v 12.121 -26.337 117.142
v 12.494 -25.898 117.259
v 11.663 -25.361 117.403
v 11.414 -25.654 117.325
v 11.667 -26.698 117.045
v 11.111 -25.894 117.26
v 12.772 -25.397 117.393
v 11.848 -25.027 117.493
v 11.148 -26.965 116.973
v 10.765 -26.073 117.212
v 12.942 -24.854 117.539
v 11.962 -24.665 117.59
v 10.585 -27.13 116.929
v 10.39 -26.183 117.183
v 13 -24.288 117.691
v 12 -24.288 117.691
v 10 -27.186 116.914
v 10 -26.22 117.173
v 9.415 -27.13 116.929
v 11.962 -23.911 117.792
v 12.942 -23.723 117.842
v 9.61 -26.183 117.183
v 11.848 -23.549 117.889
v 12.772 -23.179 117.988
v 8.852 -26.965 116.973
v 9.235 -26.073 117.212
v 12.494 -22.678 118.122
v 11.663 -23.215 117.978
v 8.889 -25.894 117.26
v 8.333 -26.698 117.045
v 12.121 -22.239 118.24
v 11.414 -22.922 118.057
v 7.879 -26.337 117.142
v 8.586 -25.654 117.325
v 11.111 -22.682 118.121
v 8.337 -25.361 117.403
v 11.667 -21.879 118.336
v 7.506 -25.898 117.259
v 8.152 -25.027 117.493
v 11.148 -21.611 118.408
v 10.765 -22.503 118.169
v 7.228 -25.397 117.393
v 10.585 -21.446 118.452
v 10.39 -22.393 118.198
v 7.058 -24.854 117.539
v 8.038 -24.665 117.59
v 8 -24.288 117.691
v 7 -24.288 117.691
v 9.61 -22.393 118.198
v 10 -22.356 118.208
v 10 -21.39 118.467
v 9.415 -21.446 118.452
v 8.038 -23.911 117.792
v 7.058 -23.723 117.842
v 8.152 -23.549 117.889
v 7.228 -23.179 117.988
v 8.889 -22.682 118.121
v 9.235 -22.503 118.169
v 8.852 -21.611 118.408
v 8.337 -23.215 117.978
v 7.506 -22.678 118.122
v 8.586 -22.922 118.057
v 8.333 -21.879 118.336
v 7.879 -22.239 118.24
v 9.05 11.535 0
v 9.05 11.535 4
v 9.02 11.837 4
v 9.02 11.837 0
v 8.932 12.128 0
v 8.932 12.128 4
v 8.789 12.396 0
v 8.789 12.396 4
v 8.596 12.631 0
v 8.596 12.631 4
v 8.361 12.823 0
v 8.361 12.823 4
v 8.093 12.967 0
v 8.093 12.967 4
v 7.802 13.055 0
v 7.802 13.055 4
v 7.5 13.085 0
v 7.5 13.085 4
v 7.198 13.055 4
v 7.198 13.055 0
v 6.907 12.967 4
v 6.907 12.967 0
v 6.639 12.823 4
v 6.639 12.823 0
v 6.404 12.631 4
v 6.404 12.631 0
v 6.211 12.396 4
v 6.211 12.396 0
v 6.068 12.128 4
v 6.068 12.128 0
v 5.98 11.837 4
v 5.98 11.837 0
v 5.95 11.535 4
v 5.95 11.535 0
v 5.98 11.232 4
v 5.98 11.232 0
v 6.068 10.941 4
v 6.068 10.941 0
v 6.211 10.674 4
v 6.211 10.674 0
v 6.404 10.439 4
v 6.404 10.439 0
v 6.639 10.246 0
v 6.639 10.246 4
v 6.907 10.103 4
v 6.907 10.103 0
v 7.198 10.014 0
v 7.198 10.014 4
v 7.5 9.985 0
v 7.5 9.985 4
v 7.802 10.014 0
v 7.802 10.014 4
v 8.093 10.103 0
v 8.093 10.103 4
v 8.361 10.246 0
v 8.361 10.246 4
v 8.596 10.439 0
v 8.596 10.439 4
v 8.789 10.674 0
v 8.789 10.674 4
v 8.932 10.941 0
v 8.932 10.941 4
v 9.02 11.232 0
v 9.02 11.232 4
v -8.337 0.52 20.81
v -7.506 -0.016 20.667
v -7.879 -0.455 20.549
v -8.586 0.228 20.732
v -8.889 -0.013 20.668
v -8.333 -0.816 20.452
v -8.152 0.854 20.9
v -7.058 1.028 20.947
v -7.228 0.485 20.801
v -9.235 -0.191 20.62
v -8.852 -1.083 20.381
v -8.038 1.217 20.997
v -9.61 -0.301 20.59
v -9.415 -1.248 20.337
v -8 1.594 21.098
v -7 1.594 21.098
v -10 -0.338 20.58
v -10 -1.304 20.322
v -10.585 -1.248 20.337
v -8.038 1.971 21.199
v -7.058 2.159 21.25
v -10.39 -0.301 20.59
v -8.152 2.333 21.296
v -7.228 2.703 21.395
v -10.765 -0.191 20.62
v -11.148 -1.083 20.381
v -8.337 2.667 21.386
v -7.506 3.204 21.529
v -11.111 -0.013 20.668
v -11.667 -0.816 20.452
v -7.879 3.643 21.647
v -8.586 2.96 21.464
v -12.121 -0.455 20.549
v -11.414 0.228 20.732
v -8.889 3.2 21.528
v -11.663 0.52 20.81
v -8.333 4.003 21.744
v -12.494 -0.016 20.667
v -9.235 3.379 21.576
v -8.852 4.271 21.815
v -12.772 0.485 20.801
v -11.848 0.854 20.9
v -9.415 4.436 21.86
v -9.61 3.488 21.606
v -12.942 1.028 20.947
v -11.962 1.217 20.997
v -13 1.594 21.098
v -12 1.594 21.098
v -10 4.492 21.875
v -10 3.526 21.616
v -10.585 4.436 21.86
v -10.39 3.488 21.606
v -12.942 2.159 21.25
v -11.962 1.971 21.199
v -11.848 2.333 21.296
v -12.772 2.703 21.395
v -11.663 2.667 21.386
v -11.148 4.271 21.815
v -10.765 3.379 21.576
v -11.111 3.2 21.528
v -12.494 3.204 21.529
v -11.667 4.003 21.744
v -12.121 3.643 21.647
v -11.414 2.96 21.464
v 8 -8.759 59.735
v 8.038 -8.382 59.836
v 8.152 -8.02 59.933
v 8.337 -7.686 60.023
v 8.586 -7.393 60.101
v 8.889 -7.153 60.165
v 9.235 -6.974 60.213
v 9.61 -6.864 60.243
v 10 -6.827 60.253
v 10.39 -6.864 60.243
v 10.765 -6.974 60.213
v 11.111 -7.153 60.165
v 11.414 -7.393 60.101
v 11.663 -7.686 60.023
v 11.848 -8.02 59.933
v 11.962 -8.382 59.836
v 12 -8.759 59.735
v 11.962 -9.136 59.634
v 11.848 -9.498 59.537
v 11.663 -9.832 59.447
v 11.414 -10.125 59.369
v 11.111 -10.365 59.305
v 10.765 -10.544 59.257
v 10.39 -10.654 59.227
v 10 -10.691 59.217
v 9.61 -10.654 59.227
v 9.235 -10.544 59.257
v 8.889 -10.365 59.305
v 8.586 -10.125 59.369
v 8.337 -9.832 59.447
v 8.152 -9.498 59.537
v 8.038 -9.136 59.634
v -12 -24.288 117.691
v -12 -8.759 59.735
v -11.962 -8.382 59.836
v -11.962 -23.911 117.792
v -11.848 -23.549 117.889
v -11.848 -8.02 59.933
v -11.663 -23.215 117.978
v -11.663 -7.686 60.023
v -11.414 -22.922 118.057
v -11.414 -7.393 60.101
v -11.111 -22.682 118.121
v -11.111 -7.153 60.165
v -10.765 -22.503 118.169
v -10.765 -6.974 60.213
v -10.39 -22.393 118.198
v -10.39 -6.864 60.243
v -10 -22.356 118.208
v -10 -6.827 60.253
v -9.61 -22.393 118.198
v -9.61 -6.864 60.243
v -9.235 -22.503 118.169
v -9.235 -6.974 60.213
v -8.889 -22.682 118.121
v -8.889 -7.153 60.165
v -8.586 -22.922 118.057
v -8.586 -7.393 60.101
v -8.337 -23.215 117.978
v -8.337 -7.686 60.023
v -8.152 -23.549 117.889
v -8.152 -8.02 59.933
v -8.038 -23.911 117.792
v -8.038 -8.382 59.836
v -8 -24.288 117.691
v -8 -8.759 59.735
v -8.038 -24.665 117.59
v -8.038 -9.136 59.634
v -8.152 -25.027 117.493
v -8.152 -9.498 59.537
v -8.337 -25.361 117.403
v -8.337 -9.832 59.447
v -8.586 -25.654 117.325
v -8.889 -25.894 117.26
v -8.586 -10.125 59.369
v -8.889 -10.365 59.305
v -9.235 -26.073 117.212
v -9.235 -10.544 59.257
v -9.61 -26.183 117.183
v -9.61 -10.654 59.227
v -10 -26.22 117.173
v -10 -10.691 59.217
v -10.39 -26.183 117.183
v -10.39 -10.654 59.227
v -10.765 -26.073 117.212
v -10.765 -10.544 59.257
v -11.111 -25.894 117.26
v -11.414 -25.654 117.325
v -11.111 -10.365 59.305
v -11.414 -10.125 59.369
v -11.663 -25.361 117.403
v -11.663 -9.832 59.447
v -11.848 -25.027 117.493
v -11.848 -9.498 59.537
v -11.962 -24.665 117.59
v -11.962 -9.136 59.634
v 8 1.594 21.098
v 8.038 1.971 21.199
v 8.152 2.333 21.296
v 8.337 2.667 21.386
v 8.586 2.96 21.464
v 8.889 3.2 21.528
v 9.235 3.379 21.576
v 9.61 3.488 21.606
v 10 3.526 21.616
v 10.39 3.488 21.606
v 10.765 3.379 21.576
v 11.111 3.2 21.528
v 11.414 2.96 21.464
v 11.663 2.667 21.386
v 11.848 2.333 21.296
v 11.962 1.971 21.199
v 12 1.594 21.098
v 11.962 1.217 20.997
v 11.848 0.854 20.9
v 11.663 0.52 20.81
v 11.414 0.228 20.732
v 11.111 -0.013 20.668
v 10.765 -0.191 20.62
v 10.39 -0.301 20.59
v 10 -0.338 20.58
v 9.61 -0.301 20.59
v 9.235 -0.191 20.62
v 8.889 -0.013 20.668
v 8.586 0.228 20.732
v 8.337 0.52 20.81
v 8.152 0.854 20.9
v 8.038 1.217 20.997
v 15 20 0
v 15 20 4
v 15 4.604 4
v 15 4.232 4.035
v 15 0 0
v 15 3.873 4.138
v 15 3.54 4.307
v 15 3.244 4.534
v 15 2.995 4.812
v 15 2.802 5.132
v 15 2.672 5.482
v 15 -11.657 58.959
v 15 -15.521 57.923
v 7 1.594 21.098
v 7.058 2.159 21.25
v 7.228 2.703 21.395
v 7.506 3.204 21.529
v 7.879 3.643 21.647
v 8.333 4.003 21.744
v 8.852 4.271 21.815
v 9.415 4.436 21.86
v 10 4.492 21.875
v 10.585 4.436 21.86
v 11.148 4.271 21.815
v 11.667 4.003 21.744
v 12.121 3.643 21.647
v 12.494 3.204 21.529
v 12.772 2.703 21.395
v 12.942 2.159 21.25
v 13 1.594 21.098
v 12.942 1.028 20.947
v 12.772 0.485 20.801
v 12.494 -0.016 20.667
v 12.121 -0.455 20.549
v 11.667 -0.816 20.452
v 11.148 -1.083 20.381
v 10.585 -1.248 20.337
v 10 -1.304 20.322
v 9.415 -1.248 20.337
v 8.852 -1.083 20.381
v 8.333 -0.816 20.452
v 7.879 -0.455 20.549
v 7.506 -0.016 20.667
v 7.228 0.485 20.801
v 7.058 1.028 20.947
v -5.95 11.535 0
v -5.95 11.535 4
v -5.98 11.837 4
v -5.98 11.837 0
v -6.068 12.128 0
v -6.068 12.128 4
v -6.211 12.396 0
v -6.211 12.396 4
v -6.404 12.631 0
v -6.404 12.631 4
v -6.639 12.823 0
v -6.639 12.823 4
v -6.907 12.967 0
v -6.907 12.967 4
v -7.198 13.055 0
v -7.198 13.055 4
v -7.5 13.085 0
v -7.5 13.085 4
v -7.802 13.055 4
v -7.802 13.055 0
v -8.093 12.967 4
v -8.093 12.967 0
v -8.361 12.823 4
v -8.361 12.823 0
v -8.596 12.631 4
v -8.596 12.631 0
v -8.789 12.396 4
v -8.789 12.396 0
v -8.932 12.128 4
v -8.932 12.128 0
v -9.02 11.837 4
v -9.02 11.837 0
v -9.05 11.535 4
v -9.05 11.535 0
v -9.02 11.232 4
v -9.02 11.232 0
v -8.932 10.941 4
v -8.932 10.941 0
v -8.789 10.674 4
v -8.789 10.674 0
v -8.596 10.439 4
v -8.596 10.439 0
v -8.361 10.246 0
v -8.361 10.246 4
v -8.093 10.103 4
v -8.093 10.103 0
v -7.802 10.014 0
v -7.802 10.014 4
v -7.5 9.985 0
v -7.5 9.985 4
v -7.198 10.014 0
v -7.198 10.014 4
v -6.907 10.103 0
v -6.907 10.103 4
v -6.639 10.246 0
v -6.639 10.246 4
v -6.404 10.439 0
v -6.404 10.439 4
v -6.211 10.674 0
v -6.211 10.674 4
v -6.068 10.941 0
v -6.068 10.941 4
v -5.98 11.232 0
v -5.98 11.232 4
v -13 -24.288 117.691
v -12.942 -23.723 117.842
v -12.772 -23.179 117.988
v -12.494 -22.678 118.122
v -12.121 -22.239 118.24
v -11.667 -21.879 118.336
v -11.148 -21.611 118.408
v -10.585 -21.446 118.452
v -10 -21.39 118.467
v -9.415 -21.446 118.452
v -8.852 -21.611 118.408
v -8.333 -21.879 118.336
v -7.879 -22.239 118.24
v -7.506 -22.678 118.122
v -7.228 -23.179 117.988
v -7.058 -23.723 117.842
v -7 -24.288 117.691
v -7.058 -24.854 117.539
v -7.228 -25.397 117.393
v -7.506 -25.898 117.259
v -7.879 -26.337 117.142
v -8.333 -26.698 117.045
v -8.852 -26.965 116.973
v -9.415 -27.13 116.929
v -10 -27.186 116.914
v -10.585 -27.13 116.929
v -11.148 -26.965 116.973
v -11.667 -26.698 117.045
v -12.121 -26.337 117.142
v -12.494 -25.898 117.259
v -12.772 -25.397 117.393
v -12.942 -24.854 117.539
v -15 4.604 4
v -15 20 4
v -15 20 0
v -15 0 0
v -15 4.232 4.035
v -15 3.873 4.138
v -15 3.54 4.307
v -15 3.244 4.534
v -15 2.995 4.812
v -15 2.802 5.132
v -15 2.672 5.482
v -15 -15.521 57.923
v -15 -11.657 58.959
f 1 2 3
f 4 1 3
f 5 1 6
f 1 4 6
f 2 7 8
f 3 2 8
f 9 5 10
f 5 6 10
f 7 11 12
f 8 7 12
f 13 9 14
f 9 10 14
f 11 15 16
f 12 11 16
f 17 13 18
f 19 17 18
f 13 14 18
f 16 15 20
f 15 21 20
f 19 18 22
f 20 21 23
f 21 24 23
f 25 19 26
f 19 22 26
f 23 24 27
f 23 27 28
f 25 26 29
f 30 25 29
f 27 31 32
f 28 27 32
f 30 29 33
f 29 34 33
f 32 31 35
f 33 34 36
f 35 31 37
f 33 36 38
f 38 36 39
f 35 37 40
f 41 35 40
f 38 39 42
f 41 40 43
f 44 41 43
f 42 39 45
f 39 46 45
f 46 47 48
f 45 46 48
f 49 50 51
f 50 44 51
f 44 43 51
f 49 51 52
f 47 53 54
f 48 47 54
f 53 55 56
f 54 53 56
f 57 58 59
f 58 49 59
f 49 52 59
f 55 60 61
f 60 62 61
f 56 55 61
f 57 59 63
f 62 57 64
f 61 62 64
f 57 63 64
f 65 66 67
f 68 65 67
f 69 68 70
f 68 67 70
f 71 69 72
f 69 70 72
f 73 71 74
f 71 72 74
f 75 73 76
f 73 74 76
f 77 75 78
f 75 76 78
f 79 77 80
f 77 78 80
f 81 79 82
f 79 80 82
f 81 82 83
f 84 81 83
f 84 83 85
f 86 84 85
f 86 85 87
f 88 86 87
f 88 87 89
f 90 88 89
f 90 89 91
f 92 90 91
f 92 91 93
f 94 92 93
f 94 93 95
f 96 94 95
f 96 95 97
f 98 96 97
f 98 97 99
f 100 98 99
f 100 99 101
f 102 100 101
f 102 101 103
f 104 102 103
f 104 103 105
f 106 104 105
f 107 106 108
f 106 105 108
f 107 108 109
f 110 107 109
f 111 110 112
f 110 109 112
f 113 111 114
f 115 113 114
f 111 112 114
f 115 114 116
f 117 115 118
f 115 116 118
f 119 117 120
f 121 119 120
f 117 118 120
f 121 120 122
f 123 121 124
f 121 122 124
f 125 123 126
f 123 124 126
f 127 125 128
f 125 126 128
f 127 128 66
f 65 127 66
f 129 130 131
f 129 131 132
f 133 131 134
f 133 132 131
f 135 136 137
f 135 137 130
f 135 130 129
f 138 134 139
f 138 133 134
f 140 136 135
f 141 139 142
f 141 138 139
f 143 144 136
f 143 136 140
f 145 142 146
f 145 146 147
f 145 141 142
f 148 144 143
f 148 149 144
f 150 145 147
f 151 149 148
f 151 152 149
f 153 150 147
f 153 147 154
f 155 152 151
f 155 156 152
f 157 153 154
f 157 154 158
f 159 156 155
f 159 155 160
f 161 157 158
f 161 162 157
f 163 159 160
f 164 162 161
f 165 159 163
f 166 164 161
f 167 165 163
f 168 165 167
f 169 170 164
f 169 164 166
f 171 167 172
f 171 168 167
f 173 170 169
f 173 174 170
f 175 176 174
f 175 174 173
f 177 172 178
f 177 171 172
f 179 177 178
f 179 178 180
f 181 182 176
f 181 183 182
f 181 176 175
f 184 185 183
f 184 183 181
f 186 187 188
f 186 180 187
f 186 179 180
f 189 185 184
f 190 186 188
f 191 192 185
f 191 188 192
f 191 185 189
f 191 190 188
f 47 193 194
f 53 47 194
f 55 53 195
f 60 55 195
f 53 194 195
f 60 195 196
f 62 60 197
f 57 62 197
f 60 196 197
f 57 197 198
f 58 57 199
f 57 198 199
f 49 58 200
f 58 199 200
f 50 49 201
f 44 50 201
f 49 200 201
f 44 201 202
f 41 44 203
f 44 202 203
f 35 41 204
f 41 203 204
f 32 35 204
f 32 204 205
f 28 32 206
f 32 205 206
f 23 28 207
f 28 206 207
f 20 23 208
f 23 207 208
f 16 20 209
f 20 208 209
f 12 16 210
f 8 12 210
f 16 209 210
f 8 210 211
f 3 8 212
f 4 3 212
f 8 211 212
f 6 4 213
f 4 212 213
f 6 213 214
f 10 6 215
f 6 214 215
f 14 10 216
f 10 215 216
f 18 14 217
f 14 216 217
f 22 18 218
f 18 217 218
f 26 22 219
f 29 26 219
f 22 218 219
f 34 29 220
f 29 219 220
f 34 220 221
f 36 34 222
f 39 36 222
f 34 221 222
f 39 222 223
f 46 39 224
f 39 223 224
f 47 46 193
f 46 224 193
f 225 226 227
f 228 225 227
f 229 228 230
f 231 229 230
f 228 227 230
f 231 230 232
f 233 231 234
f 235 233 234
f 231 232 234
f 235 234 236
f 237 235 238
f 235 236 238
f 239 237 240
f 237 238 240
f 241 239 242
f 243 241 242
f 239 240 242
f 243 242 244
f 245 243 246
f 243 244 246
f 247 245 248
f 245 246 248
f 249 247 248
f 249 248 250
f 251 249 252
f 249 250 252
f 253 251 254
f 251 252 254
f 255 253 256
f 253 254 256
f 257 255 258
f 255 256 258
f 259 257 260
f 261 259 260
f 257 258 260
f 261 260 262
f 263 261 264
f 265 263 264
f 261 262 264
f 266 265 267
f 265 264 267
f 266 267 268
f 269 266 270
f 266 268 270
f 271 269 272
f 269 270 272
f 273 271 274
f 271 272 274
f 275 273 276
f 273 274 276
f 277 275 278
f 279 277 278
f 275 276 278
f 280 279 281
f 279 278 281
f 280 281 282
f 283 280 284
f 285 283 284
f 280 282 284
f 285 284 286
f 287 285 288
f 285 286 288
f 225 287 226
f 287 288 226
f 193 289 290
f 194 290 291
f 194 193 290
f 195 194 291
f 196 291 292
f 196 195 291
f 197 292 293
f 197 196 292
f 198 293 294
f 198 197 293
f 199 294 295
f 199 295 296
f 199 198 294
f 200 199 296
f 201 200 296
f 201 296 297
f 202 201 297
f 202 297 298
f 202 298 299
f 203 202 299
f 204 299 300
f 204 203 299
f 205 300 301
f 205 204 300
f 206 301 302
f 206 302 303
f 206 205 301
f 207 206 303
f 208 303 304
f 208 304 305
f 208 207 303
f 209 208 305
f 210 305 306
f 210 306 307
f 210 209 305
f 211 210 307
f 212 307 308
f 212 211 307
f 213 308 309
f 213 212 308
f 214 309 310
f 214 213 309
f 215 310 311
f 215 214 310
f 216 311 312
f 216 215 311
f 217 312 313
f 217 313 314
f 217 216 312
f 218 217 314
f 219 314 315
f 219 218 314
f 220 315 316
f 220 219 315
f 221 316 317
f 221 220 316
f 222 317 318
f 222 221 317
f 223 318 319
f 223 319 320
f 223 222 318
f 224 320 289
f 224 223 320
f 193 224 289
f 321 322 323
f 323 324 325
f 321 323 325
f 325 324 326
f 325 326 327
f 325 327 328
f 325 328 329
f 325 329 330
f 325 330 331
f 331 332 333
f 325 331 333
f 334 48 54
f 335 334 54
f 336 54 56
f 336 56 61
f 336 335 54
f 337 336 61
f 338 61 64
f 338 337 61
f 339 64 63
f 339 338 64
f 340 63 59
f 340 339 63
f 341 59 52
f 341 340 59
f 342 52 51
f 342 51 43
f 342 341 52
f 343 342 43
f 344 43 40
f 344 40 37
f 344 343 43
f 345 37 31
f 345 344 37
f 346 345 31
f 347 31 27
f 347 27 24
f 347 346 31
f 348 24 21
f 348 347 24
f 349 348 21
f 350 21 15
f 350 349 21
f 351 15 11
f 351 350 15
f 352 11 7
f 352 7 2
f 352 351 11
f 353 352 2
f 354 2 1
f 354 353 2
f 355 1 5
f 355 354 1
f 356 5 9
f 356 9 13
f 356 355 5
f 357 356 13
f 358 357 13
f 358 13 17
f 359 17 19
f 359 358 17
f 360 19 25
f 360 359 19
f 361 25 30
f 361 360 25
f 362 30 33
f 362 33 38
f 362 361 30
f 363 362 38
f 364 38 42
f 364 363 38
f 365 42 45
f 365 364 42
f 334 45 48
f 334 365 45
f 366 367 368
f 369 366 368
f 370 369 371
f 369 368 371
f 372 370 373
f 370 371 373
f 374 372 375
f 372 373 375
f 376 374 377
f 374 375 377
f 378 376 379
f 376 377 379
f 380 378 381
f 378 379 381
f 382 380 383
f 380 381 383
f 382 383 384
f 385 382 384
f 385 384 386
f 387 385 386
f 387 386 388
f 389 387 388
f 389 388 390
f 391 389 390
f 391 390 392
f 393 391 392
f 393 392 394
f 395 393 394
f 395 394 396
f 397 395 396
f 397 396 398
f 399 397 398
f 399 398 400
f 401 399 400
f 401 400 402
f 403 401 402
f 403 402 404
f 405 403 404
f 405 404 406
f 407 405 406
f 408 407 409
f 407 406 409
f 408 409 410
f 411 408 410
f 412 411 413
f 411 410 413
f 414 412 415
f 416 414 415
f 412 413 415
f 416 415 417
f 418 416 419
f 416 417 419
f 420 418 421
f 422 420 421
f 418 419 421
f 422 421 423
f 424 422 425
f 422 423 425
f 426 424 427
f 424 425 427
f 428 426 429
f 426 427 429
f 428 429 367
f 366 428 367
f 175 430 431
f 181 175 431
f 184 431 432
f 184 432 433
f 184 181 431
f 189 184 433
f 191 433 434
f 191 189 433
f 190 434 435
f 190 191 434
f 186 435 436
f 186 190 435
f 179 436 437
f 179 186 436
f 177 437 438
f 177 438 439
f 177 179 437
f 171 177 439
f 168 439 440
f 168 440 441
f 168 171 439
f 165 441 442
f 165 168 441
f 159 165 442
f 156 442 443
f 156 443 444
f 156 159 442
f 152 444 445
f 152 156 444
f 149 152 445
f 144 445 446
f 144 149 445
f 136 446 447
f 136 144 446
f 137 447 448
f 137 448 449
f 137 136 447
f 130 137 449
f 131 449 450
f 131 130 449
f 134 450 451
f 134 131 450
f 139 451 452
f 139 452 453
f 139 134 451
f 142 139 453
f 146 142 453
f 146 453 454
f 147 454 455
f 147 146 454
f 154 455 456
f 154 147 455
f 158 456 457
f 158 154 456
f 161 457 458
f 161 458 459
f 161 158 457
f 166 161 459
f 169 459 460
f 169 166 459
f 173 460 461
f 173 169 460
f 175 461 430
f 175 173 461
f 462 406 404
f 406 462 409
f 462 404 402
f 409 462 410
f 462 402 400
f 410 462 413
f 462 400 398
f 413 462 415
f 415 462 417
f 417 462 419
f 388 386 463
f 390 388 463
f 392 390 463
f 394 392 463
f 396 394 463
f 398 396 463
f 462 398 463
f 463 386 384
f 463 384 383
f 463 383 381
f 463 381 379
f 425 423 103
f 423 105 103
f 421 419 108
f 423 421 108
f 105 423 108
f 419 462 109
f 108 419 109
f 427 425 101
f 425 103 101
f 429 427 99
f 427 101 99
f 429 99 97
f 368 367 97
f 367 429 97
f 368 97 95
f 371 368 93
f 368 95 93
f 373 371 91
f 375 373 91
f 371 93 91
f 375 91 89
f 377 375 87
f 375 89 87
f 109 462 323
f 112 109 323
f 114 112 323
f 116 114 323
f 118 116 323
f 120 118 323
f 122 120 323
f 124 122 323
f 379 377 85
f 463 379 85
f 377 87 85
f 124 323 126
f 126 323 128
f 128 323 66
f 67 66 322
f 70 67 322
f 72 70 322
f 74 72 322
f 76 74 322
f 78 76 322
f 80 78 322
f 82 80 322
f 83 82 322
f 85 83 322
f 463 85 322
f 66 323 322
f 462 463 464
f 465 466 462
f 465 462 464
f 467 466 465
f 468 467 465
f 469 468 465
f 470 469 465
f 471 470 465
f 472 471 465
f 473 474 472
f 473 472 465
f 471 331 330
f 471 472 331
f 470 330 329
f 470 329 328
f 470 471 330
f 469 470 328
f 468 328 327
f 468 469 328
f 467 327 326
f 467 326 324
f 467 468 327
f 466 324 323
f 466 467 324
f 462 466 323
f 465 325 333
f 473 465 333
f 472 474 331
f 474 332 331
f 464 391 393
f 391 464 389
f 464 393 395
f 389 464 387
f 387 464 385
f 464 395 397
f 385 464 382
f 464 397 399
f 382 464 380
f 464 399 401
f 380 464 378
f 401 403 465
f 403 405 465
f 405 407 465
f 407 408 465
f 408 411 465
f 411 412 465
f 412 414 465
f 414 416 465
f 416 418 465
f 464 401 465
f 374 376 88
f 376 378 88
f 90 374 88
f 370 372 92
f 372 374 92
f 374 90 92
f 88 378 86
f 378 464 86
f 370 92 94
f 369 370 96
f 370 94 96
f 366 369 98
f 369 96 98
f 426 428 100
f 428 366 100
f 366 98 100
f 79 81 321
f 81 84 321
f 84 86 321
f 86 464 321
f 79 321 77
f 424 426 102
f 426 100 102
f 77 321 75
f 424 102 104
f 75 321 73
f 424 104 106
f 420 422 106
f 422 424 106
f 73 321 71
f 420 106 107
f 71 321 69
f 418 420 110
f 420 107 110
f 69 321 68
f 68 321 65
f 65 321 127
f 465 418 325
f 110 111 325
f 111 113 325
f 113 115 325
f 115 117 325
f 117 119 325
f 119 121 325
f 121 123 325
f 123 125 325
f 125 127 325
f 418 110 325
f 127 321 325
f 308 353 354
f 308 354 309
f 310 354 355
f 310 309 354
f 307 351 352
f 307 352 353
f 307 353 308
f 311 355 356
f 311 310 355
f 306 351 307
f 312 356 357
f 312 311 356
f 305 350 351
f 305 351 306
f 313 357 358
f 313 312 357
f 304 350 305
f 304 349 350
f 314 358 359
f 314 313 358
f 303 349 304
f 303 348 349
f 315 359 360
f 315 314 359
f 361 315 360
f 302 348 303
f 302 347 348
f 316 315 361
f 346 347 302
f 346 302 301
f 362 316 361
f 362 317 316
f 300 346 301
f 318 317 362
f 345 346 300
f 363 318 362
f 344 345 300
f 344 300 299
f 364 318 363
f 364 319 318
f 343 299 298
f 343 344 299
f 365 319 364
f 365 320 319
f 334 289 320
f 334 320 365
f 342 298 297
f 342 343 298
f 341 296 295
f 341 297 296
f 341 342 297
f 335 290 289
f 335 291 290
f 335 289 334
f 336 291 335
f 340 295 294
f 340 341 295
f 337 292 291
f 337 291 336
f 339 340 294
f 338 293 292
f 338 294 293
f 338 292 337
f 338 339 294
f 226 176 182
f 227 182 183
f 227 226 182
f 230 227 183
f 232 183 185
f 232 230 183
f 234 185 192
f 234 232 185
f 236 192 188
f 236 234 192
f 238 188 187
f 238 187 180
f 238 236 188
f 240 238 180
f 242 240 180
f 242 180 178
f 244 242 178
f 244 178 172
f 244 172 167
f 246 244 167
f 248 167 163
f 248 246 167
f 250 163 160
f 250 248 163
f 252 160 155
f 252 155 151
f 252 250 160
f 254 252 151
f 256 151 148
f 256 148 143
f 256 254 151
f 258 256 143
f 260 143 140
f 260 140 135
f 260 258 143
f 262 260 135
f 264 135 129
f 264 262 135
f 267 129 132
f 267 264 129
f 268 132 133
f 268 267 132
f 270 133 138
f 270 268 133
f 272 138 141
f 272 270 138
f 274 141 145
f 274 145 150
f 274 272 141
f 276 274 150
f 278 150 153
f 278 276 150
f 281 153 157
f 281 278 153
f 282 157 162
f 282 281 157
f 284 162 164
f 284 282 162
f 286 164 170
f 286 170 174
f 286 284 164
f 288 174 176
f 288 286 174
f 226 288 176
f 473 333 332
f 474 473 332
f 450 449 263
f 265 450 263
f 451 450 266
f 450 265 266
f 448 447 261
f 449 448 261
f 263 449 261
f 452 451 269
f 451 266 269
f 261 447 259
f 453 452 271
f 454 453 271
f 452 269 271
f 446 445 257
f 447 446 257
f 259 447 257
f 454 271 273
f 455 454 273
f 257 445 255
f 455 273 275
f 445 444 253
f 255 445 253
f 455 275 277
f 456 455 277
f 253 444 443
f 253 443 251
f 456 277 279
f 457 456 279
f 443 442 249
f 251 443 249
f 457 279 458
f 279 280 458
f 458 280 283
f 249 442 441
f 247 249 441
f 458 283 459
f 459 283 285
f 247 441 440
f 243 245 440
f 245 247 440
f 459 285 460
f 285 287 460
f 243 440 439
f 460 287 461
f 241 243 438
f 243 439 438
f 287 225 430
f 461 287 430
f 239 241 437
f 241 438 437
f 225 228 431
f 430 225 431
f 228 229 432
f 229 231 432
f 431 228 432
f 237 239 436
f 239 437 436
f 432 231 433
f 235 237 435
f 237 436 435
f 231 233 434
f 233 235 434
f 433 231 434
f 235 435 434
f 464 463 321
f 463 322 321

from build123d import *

# Parameters (mm, degrees)
BOSS_EXTRUDE1_DEPTH        = 15
SKETCH2_R                  = 3
SKETCH2_R_2                = 2
BOSS_EXTRUDE2_DEPTH        = 40
BOSS_EXTRUDE2_DEPTH_BACK   = 60
BOSS_EXTRUDE2_2_DEPTH      = 40
BOSS_EXTRUDE2_2_DEPTH_BACK = 60
SKETCH4_R                  = 1.55
CUT_EXTRUDE1_DEPTH         = 5
FILLET1_R                  = 2


with BuildPart() as part:
    # Sketch1 → Boss-Extrude1 (new body, symmetric)
    with BuildSketch(Plane.YZ):
        Polygon((-11.656809702, 58.958619281), (3.069307952, 4), (20, 4), (20, 0), (0, 0), (-15.520513007, 57.923343101), align=None)
    extrude(amount=BOSS_EXTRUDE1_DEPTH, both=True)

    # Sketch4 → Cut-Extrude1 (cut, through all)
    with BuildSketch(Plane.XY.offset(4)):
        with Locations((-7.5, 11.534653976)):
            Circle(SKETCH4_R)
        with Locations((7.5, 11.534653976)):
            Circle(SKETCH4_R)
    extrude(amount=-CUT_EXTRUDE1_DEPTH, mode=Mode.SUBTRACT)

    # Fillet1
    fillet1_edges = [part.edges().sort_by_distance(p)[0] for p in [
        (0, 3.069307952, 4),
    ]]
    fillet(fillet1_edges, radius=FILLET1_R)


with BuildPart() as body_2:
    # Sketch2 → Boss-Extrude2 (new body, two sides)
    with BuildSketch(Plane(origin=(0, -15.520513007, 57.923343101), x_dir=(-1, 0, 0), z_dir=(0, 0.258819045, -0.965925826))) as boss_extrude2_sk:
        with Locations((-10, 7)):
            Circle(SKETCH2_R)
        with Locations((-10, 7)):
            Circle(SKETCH2_R_2, mode=Mode.SUBTRACT)
    extrude(amount=BOSS_EXTRUDE2_DEPTH)
    extrude(boss_extrude2_sk.sketch, amount=-BOSS_EXTRUDE2_DEPTH_BACK)


with BuildPart() as body_3:
    # Sketch2 → Boss-Extrude2 2 (new body, two sides)
    with BuildSketch(Plane(origin=(0, -15.520513007, 57.923343101), x_dir=(-1, 0, 0), z_dir=(0, 0.258819045, -0.965925826))) as boss_extrude2_2_sk:
        with Locations((10, 7)):
            Circle(SKETCH2_R)
        with Locations((10, 7)):
            Circle(SKETCH2_R_2, mode=Mode.SUBTRACT)
    extrude(amount=BOSS_EXTRUDE2_2_DEPTH)
    extrude(boss_extrude2_2_sk.sketch, amount=-BOSS_EXTRUDE2_2_DEPTH_BACK)


solid = Compound([part.part, body_2.part, body_3.part])
